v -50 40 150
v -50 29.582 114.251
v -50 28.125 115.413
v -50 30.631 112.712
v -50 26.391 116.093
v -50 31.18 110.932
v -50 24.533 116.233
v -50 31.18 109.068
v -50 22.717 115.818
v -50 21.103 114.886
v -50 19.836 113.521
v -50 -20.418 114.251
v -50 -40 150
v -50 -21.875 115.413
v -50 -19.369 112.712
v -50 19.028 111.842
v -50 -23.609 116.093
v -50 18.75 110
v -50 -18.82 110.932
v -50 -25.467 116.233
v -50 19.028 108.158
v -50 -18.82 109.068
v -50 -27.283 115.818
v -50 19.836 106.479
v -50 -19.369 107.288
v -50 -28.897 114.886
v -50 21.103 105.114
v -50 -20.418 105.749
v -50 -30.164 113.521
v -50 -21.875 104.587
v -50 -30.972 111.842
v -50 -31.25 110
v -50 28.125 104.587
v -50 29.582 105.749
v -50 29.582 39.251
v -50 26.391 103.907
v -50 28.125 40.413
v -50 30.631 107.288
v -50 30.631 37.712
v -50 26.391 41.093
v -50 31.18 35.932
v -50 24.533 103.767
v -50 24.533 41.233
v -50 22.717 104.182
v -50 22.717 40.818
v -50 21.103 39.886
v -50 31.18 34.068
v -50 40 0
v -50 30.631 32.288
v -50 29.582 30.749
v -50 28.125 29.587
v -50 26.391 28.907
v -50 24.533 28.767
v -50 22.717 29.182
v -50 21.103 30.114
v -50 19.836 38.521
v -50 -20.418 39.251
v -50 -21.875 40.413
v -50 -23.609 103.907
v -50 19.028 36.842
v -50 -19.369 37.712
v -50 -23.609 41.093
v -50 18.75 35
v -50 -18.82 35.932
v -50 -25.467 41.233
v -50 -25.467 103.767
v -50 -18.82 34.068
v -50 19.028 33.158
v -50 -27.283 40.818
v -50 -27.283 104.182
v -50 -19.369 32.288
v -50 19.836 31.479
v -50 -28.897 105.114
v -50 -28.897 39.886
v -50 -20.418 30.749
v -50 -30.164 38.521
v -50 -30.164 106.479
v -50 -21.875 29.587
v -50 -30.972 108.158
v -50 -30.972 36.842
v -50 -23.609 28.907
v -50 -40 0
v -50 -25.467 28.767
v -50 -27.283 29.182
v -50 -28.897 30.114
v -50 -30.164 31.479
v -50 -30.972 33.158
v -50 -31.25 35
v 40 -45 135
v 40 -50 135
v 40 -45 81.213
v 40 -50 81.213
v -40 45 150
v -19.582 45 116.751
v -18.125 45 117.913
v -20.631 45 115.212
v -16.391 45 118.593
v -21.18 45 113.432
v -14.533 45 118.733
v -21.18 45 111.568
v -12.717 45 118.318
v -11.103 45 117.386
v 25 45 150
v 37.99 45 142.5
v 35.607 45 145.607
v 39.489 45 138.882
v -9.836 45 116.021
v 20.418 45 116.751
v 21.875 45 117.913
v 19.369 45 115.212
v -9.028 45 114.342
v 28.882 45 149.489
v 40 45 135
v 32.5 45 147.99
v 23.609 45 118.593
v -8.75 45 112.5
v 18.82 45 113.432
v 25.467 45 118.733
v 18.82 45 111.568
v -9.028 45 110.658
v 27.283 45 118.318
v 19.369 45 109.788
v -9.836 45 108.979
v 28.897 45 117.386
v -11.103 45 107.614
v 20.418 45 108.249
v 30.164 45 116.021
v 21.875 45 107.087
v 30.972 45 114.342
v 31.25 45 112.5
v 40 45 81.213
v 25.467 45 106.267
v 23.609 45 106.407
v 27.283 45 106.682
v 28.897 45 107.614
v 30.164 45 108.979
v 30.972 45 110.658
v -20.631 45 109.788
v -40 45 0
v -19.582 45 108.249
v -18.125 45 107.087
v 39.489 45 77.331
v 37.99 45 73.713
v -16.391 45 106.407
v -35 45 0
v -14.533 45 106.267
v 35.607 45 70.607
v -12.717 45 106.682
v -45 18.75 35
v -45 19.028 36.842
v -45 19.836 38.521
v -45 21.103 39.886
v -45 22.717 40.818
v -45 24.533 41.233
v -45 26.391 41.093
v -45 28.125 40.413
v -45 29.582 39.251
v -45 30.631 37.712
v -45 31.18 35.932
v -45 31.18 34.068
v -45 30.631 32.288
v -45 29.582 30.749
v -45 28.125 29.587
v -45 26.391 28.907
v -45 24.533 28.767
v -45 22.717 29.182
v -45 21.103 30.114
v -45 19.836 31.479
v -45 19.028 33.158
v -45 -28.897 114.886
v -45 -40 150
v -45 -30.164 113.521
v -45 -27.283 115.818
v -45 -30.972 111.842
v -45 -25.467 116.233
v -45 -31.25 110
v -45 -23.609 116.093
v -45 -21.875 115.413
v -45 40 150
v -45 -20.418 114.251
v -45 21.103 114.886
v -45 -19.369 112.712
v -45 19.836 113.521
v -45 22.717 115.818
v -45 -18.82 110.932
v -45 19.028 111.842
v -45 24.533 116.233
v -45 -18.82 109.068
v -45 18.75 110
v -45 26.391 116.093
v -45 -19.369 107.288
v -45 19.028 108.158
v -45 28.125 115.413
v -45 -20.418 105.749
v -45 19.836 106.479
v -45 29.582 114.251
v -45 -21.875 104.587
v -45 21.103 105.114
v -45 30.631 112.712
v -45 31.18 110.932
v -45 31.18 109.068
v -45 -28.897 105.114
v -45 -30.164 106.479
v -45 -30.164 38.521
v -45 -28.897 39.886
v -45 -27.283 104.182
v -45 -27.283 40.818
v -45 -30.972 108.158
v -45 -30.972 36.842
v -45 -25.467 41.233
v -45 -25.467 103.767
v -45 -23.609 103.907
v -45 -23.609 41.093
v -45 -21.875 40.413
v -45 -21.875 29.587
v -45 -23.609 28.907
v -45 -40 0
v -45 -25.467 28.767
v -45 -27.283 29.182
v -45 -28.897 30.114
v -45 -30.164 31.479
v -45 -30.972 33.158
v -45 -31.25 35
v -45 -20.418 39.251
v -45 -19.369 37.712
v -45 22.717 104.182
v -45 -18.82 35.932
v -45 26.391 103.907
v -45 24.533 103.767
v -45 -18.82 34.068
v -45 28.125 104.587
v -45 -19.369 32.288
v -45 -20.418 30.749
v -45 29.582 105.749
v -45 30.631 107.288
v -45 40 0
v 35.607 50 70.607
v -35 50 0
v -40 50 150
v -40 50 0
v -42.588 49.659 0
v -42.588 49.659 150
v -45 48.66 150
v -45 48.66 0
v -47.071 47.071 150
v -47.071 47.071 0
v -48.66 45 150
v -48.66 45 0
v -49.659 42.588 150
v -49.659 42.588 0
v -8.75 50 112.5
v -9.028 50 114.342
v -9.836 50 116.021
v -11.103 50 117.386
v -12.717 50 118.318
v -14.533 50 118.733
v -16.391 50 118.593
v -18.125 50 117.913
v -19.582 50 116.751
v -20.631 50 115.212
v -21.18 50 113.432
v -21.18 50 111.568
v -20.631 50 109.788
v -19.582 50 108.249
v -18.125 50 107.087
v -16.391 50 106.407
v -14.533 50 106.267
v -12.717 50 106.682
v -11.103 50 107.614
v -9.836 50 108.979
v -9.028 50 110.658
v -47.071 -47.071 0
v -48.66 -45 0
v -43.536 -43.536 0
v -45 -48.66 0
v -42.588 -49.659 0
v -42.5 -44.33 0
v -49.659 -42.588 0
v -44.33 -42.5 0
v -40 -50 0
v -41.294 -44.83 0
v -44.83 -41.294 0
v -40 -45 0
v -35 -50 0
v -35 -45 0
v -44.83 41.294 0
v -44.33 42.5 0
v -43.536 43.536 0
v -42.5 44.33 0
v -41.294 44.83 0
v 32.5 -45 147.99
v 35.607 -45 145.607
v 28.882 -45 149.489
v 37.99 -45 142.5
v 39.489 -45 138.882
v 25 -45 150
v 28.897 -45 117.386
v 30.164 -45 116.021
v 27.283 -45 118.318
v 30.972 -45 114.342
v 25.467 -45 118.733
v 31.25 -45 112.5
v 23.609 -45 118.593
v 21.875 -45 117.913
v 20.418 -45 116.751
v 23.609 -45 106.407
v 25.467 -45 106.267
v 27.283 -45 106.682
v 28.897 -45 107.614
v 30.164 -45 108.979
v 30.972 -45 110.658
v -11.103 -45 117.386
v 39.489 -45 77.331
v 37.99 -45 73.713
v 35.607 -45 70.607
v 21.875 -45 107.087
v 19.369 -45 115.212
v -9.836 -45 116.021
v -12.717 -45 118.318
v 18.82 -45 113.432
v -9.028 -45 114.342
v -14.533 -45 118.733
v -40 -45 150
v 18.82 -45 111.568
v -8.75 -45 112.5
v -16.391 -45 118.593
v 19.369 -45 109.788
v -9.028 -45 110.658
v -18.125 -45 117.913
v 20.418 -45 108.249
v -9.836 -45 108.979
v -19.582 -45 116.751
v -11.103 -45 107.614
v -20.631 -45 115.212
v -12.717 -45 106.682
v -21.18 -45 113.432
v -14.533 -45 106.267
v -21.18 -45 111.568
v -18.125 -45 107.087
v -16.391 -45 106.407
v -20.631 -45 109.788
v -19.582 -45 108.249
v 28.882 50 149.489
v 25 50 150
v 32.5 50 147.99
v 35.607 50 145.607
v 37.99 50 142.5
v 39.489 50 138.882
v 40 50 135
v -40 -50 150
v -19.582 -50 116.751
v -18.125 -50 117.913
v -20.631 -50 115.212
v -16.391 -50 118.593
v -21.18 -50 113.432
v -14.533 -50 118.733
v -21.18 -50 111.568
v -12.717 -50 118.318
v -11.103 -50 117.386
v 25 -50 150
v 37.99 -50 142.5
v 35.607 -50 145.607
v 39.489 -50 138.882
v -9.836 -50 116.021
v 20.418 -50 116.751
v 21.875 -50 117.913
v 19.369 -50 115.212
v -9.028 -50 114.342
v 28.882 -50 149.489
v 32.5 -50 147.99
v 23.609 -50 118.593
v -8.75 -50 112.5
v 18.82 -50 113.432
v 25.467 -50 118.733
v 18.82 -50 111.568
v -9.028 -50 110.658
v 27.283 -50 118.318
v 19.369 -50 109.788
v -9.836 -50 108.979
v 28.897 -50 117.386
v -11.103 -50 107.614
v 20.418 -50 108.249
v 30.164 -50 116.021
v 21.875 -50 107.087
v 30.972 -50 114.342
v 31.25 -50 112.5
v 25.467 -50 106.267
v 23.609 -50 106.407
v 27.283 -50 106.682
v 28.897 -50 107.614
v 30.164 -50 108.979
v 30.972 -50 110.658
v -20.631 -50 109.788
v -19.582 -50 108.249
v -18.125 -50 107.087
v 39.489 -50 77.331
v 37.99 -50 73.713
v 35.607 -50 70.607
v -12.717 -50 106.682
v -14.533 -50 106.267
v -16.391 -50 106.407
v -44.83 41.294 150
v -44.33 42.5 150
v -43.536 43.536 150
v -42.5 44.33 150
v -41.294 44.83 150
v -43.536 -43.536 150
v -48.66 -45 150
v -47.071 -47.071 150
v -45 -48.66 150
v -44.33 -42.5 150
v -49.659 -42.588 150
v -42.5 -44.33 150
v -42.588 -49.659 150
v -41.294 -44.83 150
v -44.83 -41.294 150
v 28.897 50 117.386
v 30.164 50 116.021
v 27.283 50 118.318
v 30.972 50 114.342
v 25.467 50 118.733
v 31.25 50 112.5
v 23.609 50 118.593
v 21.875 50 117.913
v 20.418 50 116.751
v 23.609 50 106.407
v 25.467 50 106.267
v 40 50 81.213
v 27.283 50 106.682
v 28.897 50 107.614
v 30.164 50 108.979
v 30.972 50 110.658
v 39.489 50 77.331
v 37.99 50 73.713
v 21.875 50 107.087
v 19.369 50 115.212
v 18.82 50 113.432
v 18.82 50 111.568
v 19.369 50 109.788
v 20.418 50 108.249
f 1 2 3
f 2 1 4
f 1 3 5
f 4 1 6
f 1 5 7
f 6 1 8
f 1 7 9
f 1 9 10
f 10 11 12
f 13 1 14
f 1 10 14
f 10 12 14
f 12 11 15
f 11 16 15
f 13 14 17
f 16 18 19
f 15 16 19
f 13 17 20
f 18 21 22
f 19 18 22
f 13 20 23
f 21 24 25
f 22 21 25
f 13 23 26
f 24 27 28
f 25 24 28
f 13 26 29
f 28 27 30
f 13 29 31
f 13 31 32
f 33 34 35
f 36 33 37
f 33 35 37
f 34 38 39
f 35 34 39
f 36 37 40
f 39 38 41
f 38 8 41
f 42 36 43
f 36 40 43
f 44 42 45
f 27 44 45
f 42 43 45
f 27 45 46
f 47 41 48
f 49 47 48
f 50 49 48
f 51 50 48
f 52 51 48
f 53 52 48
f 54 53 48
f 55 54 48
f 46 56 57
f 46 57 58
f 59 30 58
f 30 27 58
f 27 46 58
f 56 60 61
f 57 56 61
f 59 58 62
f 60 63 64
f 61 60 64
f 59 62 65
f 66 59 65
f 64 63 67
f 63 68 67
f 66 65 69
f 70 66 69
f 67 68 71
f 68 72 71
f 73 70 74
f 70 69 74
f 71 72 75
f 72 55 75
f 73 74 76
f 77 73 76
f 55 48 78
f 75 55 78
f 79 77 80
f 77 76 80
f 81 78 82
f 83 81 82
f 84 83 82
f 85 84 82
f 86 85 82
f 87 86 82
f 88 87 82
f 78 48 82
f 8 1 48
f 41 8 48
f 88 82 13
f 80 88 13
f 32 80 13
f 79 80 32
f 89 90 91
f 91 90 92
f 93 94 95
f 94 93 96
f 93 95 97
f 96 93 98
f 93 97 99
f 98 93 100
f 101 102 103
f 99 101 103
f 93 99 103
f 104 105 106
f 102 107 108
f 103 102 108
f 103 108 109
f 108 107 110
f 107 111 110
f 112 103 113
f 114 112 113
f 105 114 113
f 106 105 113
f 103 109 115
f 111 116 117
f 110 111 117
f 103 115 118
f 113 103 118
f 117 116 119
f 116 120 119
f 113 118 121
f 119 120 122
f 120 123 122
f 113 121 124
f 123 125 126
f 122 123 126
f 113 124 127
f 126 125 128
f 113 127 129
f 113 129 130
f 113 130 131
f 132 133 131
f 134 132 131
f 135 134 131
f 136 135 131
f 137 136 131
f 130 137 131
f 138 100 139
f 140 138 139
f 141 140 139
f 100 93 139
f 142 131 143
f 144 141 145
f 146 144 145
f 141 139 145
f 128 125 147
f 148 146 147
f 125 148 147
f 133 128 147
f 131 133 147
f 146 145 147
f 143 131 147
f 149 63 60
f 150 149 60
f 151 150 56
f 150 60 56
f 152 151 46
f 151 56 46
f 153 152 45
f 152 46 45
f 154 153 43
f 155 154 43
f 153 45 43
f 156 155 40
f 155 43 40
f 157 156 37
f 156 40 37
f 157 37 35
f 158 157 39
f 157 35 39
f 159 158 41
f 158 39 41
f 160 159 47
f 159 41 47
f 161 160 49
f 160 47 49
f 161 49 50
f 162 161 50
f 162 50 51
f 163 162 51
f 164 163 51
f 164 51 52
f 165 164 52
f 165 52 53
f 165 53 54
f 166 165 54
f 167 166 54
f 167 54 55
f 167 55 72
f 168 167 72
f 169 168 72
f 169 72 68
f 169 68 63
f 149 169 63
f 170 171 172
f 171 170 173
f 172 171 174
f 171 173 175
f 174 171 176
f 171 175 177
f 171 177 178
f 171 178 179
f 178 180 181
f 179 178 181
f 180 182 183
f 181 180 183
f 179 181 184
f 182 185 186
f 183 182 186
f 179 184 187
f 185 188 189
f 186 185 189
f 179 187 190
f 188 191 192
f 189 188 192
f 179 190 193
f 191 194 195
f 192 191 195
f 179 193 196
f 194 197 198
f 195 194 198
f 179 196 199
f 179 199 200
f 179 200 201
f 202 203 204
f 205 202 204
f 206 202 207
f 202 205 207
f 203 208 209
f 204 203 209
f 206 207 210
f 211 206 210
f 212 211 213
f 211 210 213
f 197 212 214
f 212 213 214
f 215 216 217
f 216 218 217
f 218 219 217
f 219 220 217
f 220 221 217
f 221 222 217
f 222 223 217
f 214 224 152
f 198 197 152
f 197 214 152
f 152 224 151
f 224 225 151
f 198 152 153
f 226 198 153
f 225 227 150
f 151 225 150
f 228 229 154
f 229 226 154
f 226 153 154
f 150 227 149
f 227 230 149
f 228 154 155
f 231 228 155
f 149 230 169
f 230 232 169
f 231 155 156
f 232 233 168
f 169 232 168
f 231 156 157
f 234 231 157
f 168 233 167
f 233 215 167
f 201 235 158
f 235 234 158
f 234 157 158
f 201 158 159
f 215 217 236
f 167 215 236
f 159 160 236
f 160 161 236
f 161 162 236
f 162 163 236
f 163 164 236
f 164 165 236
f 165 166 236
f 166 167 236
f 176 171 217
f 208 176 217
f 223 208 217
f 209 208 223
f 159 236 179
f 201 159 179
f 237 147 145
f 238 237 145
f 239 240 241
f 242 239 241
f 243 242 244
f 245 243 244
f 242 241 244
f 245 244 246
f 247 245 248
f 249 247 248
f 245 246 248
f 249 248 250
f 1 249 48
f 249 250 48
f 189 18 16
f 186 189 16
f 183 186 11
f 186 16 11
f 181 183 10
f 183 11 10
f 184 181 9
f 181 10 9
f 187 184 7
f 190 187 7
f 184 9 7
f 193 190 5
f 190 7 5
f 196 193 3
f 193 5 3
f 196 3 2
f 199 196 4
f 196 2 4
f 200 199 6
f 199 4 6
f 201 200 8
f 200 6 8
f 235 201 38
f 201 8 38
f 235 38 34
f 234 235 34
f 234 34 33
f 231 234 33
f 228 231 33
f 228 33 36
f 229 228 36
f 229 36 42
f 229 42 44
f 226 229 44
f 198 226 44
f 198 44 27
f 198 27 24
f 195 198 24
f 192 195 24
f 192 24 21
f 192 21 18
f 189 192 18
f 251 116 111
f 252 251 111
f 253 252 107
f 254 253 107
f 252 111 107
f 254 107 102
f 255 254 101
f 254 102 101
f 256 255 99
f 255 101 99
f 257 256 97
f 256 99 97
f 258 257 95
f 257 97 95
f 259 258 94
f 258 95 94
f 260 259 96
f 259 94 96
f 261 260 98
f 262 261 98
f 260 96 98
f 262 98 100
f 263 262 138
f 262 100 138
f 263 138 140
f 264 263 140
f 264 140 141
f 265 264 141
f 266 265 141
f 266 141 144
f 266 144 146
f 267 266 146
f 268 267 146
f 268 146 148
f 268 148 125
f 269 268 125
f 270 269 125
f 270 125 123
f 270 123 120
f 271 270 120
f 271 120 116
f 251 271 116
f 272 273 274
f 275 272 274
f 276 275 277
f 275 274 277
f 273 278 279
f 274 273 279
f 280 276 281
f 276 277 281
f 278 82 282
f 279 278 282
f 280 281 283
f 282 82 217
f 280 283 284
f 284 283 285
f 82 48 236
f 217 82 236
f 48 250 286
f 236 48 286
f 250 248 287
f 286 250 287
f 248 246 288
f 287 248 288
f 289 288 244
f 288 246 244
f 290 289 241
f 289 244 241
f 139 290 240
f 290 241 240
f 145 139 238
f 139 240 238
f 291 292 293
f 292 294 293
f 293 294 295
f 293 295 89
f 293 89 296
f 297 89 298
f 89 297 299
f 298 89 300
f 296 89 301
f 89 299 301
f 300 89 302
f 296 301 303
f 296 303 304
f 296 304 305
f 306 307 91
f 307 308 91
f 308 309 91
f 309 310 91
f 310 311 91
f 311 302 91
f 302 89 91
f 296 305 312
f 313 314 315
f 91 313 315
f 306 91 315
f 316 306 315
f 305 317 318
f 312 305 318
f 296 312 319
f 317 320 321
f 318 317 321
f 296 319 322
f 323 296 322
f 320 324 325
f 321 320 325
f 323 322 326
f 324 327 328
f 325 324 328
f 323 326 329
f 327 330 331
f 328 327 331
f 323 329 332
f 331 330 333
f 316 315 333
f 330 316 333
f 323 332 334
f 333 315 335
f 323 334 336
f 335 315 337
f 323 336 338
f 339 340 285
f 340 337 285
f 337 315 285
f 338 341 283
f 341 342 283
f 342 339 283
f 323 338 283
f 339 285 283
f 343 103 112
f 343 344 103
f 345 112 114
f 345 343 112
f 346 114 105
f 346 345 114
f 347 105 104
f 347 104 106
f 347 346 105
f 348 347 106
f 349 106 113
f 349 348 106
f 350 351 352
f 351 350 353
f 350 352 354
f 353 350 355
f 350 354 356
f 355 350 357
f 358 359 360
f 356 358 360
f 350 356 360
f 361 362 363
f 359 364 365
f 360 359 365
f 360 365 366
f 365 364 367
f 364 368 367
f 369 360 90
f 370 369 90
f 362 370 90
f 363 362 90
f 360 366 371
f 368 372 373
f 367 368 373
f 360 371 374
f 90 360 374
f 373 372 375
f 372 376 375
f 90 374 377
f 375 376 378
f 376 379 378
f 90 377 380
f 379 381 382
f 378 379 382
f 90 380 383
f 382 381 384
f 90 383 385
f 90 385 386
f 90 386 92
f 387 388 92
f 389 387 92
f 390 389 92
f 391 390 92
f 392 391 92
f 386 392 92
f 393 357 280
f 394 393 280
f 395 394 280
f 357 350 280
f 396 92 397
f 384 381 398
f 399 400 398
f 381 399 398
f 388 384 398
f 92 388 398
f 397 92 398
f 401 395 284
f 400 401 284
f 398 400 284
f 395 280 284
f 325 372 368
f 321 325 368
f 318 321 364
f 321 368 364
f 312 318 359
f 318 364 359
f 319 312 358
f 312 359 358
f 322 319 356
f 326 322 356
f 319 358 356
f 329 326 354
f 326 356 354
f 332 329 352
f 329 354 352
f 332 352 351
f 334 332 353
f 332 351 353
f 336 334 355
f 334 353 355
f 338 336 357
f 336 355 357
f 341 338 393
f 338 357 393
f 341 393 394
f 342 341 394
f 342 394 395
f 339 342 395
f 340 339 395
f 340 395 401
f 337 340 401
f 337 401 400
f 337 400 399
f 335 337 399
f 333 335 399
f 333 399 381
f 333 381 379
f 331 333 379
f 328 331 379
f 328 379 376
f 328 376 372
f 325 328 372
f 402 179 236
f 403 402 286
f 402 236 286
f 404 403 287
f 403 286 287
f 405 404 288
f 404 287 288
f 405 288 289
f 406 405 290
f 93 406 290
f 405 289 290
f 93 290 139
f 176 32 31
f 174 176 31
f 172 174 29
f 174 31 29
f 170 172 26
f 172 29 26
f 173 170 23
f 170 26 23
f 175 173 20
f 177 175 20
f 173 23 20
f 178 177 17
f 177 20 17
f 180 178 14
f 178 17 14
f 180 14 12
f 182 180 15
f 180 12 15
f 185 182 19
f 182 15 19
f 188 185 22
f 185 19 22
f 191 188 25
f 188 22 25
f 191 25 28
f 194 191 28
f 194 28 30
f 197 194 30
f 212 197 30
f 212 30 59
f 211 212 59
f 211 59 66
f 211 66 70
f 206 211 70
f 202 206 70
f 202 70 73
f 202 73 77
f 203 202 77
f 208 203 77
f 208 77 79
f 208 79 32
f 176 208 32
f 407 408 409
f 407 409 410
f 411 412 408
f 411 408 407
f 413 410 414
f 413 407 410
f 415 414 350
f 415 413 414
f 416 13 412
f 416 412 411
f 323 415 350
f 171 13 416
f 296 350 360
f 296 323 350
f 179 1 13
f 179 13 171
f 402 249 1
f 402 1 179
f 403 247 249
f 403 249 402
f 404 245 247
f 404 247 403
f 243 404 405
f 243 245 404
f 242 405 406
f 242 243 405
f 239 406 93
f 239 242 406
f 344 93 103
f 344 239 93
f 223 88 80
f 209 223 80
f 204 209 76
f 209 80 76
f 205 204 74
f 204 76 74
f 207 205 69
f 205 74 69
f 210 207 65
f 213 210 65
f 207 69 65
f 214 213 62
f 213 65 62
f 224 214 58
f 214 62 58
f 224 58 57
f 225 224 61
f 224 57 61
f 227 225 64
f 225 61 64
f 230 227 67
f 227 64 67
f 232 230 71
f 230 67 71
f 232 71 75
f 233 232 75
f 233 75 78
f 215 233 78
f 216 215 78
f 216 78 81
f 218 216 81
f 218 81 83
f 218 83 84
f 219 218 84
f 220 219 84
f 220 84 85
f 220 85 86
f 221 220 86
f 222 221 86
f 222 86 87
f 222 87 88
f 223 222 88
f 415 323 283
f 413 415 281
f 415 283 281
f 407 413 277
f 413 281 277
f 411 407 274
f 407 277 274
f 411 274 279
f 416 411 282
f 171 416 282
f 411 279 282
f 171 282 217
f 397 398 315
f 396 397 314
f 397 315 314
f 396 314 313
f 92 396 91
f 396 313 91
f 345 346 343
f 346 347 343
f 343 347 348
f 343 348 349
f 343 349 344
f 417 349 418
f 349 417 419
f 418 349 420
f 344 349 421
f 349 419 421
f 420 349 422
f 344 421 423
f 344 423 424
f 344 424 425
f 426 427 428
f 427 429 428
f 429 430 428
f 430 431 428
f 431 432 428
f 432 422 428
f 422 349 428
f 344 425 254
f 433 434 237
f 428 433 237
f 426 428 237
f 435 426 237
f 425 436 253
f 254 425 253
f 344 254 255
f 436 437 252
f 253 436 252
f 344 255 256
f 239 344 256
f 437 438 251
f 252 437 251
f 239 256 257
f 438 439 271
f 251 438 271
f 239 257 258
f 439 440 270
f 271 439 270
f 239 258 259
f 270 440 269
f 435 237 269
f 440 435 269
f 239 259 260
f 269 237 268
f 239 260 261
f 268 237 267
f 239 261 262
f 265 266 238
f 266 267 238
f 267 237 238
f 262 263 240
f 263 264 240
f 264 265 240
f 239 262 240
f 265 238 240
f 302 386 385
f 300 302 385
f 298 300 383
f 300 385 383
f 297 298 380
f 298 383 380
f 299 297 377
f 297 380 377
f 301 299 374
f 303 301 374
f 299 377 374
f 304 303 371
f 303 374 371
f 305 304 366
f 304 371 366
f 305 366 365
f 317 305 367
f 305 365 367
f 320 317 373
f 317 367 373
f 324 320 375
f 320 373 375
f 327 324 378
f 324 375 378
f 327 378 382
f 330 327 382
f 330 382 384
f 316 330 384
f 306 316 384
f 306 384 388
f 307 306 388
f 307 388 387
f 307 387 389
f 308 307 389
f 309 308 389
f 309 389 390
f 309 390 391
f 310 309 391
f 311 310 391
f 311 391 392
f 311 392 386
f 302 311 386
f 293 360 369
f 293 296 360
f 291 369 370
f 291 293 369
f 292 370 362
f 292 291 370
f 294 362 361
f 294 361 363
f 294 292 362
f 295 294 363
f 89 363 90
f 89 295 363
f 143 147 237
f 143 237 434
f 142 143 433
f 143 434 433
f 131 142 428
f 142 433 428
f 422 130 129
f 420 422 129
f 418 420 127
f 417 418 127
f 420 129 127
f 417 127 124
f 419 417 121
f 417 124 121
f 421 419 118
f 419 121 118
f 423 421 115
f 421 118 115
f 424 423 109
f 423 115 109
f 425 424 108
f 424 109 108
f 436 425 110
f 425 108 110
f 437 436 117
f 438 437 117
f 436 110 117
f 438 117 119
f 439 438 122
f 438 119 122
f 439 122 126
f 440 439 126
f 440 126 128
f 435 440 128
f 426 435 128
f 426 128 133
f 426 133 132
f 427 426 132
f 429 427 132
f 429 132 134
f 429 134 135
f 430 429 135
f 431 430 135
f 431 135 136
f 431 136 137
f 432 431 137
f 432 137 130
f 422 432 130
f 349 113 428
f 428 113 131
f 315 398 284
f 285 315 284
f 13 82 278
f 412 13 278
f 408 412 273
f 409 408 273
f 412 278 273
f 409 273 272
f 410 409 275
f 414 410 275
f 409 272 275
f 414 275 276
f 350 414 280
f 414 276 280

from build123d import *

# Parameters (mm, degrees)
F1_DEPTH = 150
F2_R     = 6.25
F3_DEPTH = 100.001
F4_R     = 6.25
F5_DEPTH = 90.001
F6_R     = 15


with BuildPart() as f1:
    # F0 (on Top) → F1 (new body)
    with BuildSketch(Plane.XY):
        with BuildLine():
            ThreePointArc((50, 40), (47.0710678119, 47.0710678119), (40, 50))
            Line((40, 50), (-40, 50))
            ThreePointArc((-40, 50), (-47.0710678119, 47.0710678119), (-50, 40))
            Line((-50, 40), (-50, -40))
            ThreePointArc((-50, -40), (-47.0710678119, -47.0710678119), (-40, -50))
            Line((-40, -50), (40, -50))
            ThreePointArc((40, -50), (47.0710678119, -47.0710678119), (50, -40))
            Line((50, -40), (50, 40))
        make_face()
        with BuildLine():
            ThreePointArc((40, 45.0000017881), (43.5355351703, 43.5355351703), (45.0000017881, 40))
            Line((45.0000017881, 40), (45.0000017881, -40))
            ThreePointArc((45.0000017881, -40), (43.5355351703, -43.5355351703), (40, -45.0000017881))
            Line((40, -45.0000017881), (-40, -45.0000017881))
            ThreePointArc((-40, -45.0000017881), (-43.5355351703, -43.5355351703), (-45.0000017881, -40))
            Line((-45.0000017881, -40), (-45.0000017881, 40))
            ThreePointArc((-45.0000017881, 40), (-43.5355351703, 43.5355351703), (-40, 45.0000017881))
            Line((-40, 45.0000017881), (40, 45.0000017881))
        make_face(mode=Mode.SUBTRACT)
    extrude(amount=F1_DEPTH)

    # F2 (on face) → F3 (cut, through all)
    with BuildSketch(Plane.XZ.offset(50)):
        Polygon((50, 150), (40, 150), (40, 75), (-35, 0), (50, 0), align=None)
        with Locations((-15, 112.5)):
            Circle(F2_R)
        with Locations((25, 112.5)):
            Circle(F2_R)
    extrude(amount=-F3_DEPTH, mode=Mode.SUBTRACT)

    # F4 (on face) → F5 (cut, through all)
    with BuildSketch(Plane(origin=(-50, 0, 0), x_dir=(0, -1, 0), z_dir=(-1, 0, 0))):
        with Locations((-25, 110)):
            Circle(F4_R)
        with Locations((-25, 35)):
            Circle(F4_R)
        with Locations((25, 35)):
            Circle(F4_R)
        with Locations((25, 110)):
            Circle(F4_R)
    extrude(amount=-F5_DEPTH, mode=Mode.SUBTRACT)

    # F6
    f6_edges = [f1.edges().sort_by_distance(p)[0] for p in [
        (40, -47.500001, 75),
        (40, -47.500001, 150),
        (40, 47.500001, 150),
        (40, 47.500001, 75),
    ]]
    fillet(f6_edges, radius=F6_R)


solid = f1.part
